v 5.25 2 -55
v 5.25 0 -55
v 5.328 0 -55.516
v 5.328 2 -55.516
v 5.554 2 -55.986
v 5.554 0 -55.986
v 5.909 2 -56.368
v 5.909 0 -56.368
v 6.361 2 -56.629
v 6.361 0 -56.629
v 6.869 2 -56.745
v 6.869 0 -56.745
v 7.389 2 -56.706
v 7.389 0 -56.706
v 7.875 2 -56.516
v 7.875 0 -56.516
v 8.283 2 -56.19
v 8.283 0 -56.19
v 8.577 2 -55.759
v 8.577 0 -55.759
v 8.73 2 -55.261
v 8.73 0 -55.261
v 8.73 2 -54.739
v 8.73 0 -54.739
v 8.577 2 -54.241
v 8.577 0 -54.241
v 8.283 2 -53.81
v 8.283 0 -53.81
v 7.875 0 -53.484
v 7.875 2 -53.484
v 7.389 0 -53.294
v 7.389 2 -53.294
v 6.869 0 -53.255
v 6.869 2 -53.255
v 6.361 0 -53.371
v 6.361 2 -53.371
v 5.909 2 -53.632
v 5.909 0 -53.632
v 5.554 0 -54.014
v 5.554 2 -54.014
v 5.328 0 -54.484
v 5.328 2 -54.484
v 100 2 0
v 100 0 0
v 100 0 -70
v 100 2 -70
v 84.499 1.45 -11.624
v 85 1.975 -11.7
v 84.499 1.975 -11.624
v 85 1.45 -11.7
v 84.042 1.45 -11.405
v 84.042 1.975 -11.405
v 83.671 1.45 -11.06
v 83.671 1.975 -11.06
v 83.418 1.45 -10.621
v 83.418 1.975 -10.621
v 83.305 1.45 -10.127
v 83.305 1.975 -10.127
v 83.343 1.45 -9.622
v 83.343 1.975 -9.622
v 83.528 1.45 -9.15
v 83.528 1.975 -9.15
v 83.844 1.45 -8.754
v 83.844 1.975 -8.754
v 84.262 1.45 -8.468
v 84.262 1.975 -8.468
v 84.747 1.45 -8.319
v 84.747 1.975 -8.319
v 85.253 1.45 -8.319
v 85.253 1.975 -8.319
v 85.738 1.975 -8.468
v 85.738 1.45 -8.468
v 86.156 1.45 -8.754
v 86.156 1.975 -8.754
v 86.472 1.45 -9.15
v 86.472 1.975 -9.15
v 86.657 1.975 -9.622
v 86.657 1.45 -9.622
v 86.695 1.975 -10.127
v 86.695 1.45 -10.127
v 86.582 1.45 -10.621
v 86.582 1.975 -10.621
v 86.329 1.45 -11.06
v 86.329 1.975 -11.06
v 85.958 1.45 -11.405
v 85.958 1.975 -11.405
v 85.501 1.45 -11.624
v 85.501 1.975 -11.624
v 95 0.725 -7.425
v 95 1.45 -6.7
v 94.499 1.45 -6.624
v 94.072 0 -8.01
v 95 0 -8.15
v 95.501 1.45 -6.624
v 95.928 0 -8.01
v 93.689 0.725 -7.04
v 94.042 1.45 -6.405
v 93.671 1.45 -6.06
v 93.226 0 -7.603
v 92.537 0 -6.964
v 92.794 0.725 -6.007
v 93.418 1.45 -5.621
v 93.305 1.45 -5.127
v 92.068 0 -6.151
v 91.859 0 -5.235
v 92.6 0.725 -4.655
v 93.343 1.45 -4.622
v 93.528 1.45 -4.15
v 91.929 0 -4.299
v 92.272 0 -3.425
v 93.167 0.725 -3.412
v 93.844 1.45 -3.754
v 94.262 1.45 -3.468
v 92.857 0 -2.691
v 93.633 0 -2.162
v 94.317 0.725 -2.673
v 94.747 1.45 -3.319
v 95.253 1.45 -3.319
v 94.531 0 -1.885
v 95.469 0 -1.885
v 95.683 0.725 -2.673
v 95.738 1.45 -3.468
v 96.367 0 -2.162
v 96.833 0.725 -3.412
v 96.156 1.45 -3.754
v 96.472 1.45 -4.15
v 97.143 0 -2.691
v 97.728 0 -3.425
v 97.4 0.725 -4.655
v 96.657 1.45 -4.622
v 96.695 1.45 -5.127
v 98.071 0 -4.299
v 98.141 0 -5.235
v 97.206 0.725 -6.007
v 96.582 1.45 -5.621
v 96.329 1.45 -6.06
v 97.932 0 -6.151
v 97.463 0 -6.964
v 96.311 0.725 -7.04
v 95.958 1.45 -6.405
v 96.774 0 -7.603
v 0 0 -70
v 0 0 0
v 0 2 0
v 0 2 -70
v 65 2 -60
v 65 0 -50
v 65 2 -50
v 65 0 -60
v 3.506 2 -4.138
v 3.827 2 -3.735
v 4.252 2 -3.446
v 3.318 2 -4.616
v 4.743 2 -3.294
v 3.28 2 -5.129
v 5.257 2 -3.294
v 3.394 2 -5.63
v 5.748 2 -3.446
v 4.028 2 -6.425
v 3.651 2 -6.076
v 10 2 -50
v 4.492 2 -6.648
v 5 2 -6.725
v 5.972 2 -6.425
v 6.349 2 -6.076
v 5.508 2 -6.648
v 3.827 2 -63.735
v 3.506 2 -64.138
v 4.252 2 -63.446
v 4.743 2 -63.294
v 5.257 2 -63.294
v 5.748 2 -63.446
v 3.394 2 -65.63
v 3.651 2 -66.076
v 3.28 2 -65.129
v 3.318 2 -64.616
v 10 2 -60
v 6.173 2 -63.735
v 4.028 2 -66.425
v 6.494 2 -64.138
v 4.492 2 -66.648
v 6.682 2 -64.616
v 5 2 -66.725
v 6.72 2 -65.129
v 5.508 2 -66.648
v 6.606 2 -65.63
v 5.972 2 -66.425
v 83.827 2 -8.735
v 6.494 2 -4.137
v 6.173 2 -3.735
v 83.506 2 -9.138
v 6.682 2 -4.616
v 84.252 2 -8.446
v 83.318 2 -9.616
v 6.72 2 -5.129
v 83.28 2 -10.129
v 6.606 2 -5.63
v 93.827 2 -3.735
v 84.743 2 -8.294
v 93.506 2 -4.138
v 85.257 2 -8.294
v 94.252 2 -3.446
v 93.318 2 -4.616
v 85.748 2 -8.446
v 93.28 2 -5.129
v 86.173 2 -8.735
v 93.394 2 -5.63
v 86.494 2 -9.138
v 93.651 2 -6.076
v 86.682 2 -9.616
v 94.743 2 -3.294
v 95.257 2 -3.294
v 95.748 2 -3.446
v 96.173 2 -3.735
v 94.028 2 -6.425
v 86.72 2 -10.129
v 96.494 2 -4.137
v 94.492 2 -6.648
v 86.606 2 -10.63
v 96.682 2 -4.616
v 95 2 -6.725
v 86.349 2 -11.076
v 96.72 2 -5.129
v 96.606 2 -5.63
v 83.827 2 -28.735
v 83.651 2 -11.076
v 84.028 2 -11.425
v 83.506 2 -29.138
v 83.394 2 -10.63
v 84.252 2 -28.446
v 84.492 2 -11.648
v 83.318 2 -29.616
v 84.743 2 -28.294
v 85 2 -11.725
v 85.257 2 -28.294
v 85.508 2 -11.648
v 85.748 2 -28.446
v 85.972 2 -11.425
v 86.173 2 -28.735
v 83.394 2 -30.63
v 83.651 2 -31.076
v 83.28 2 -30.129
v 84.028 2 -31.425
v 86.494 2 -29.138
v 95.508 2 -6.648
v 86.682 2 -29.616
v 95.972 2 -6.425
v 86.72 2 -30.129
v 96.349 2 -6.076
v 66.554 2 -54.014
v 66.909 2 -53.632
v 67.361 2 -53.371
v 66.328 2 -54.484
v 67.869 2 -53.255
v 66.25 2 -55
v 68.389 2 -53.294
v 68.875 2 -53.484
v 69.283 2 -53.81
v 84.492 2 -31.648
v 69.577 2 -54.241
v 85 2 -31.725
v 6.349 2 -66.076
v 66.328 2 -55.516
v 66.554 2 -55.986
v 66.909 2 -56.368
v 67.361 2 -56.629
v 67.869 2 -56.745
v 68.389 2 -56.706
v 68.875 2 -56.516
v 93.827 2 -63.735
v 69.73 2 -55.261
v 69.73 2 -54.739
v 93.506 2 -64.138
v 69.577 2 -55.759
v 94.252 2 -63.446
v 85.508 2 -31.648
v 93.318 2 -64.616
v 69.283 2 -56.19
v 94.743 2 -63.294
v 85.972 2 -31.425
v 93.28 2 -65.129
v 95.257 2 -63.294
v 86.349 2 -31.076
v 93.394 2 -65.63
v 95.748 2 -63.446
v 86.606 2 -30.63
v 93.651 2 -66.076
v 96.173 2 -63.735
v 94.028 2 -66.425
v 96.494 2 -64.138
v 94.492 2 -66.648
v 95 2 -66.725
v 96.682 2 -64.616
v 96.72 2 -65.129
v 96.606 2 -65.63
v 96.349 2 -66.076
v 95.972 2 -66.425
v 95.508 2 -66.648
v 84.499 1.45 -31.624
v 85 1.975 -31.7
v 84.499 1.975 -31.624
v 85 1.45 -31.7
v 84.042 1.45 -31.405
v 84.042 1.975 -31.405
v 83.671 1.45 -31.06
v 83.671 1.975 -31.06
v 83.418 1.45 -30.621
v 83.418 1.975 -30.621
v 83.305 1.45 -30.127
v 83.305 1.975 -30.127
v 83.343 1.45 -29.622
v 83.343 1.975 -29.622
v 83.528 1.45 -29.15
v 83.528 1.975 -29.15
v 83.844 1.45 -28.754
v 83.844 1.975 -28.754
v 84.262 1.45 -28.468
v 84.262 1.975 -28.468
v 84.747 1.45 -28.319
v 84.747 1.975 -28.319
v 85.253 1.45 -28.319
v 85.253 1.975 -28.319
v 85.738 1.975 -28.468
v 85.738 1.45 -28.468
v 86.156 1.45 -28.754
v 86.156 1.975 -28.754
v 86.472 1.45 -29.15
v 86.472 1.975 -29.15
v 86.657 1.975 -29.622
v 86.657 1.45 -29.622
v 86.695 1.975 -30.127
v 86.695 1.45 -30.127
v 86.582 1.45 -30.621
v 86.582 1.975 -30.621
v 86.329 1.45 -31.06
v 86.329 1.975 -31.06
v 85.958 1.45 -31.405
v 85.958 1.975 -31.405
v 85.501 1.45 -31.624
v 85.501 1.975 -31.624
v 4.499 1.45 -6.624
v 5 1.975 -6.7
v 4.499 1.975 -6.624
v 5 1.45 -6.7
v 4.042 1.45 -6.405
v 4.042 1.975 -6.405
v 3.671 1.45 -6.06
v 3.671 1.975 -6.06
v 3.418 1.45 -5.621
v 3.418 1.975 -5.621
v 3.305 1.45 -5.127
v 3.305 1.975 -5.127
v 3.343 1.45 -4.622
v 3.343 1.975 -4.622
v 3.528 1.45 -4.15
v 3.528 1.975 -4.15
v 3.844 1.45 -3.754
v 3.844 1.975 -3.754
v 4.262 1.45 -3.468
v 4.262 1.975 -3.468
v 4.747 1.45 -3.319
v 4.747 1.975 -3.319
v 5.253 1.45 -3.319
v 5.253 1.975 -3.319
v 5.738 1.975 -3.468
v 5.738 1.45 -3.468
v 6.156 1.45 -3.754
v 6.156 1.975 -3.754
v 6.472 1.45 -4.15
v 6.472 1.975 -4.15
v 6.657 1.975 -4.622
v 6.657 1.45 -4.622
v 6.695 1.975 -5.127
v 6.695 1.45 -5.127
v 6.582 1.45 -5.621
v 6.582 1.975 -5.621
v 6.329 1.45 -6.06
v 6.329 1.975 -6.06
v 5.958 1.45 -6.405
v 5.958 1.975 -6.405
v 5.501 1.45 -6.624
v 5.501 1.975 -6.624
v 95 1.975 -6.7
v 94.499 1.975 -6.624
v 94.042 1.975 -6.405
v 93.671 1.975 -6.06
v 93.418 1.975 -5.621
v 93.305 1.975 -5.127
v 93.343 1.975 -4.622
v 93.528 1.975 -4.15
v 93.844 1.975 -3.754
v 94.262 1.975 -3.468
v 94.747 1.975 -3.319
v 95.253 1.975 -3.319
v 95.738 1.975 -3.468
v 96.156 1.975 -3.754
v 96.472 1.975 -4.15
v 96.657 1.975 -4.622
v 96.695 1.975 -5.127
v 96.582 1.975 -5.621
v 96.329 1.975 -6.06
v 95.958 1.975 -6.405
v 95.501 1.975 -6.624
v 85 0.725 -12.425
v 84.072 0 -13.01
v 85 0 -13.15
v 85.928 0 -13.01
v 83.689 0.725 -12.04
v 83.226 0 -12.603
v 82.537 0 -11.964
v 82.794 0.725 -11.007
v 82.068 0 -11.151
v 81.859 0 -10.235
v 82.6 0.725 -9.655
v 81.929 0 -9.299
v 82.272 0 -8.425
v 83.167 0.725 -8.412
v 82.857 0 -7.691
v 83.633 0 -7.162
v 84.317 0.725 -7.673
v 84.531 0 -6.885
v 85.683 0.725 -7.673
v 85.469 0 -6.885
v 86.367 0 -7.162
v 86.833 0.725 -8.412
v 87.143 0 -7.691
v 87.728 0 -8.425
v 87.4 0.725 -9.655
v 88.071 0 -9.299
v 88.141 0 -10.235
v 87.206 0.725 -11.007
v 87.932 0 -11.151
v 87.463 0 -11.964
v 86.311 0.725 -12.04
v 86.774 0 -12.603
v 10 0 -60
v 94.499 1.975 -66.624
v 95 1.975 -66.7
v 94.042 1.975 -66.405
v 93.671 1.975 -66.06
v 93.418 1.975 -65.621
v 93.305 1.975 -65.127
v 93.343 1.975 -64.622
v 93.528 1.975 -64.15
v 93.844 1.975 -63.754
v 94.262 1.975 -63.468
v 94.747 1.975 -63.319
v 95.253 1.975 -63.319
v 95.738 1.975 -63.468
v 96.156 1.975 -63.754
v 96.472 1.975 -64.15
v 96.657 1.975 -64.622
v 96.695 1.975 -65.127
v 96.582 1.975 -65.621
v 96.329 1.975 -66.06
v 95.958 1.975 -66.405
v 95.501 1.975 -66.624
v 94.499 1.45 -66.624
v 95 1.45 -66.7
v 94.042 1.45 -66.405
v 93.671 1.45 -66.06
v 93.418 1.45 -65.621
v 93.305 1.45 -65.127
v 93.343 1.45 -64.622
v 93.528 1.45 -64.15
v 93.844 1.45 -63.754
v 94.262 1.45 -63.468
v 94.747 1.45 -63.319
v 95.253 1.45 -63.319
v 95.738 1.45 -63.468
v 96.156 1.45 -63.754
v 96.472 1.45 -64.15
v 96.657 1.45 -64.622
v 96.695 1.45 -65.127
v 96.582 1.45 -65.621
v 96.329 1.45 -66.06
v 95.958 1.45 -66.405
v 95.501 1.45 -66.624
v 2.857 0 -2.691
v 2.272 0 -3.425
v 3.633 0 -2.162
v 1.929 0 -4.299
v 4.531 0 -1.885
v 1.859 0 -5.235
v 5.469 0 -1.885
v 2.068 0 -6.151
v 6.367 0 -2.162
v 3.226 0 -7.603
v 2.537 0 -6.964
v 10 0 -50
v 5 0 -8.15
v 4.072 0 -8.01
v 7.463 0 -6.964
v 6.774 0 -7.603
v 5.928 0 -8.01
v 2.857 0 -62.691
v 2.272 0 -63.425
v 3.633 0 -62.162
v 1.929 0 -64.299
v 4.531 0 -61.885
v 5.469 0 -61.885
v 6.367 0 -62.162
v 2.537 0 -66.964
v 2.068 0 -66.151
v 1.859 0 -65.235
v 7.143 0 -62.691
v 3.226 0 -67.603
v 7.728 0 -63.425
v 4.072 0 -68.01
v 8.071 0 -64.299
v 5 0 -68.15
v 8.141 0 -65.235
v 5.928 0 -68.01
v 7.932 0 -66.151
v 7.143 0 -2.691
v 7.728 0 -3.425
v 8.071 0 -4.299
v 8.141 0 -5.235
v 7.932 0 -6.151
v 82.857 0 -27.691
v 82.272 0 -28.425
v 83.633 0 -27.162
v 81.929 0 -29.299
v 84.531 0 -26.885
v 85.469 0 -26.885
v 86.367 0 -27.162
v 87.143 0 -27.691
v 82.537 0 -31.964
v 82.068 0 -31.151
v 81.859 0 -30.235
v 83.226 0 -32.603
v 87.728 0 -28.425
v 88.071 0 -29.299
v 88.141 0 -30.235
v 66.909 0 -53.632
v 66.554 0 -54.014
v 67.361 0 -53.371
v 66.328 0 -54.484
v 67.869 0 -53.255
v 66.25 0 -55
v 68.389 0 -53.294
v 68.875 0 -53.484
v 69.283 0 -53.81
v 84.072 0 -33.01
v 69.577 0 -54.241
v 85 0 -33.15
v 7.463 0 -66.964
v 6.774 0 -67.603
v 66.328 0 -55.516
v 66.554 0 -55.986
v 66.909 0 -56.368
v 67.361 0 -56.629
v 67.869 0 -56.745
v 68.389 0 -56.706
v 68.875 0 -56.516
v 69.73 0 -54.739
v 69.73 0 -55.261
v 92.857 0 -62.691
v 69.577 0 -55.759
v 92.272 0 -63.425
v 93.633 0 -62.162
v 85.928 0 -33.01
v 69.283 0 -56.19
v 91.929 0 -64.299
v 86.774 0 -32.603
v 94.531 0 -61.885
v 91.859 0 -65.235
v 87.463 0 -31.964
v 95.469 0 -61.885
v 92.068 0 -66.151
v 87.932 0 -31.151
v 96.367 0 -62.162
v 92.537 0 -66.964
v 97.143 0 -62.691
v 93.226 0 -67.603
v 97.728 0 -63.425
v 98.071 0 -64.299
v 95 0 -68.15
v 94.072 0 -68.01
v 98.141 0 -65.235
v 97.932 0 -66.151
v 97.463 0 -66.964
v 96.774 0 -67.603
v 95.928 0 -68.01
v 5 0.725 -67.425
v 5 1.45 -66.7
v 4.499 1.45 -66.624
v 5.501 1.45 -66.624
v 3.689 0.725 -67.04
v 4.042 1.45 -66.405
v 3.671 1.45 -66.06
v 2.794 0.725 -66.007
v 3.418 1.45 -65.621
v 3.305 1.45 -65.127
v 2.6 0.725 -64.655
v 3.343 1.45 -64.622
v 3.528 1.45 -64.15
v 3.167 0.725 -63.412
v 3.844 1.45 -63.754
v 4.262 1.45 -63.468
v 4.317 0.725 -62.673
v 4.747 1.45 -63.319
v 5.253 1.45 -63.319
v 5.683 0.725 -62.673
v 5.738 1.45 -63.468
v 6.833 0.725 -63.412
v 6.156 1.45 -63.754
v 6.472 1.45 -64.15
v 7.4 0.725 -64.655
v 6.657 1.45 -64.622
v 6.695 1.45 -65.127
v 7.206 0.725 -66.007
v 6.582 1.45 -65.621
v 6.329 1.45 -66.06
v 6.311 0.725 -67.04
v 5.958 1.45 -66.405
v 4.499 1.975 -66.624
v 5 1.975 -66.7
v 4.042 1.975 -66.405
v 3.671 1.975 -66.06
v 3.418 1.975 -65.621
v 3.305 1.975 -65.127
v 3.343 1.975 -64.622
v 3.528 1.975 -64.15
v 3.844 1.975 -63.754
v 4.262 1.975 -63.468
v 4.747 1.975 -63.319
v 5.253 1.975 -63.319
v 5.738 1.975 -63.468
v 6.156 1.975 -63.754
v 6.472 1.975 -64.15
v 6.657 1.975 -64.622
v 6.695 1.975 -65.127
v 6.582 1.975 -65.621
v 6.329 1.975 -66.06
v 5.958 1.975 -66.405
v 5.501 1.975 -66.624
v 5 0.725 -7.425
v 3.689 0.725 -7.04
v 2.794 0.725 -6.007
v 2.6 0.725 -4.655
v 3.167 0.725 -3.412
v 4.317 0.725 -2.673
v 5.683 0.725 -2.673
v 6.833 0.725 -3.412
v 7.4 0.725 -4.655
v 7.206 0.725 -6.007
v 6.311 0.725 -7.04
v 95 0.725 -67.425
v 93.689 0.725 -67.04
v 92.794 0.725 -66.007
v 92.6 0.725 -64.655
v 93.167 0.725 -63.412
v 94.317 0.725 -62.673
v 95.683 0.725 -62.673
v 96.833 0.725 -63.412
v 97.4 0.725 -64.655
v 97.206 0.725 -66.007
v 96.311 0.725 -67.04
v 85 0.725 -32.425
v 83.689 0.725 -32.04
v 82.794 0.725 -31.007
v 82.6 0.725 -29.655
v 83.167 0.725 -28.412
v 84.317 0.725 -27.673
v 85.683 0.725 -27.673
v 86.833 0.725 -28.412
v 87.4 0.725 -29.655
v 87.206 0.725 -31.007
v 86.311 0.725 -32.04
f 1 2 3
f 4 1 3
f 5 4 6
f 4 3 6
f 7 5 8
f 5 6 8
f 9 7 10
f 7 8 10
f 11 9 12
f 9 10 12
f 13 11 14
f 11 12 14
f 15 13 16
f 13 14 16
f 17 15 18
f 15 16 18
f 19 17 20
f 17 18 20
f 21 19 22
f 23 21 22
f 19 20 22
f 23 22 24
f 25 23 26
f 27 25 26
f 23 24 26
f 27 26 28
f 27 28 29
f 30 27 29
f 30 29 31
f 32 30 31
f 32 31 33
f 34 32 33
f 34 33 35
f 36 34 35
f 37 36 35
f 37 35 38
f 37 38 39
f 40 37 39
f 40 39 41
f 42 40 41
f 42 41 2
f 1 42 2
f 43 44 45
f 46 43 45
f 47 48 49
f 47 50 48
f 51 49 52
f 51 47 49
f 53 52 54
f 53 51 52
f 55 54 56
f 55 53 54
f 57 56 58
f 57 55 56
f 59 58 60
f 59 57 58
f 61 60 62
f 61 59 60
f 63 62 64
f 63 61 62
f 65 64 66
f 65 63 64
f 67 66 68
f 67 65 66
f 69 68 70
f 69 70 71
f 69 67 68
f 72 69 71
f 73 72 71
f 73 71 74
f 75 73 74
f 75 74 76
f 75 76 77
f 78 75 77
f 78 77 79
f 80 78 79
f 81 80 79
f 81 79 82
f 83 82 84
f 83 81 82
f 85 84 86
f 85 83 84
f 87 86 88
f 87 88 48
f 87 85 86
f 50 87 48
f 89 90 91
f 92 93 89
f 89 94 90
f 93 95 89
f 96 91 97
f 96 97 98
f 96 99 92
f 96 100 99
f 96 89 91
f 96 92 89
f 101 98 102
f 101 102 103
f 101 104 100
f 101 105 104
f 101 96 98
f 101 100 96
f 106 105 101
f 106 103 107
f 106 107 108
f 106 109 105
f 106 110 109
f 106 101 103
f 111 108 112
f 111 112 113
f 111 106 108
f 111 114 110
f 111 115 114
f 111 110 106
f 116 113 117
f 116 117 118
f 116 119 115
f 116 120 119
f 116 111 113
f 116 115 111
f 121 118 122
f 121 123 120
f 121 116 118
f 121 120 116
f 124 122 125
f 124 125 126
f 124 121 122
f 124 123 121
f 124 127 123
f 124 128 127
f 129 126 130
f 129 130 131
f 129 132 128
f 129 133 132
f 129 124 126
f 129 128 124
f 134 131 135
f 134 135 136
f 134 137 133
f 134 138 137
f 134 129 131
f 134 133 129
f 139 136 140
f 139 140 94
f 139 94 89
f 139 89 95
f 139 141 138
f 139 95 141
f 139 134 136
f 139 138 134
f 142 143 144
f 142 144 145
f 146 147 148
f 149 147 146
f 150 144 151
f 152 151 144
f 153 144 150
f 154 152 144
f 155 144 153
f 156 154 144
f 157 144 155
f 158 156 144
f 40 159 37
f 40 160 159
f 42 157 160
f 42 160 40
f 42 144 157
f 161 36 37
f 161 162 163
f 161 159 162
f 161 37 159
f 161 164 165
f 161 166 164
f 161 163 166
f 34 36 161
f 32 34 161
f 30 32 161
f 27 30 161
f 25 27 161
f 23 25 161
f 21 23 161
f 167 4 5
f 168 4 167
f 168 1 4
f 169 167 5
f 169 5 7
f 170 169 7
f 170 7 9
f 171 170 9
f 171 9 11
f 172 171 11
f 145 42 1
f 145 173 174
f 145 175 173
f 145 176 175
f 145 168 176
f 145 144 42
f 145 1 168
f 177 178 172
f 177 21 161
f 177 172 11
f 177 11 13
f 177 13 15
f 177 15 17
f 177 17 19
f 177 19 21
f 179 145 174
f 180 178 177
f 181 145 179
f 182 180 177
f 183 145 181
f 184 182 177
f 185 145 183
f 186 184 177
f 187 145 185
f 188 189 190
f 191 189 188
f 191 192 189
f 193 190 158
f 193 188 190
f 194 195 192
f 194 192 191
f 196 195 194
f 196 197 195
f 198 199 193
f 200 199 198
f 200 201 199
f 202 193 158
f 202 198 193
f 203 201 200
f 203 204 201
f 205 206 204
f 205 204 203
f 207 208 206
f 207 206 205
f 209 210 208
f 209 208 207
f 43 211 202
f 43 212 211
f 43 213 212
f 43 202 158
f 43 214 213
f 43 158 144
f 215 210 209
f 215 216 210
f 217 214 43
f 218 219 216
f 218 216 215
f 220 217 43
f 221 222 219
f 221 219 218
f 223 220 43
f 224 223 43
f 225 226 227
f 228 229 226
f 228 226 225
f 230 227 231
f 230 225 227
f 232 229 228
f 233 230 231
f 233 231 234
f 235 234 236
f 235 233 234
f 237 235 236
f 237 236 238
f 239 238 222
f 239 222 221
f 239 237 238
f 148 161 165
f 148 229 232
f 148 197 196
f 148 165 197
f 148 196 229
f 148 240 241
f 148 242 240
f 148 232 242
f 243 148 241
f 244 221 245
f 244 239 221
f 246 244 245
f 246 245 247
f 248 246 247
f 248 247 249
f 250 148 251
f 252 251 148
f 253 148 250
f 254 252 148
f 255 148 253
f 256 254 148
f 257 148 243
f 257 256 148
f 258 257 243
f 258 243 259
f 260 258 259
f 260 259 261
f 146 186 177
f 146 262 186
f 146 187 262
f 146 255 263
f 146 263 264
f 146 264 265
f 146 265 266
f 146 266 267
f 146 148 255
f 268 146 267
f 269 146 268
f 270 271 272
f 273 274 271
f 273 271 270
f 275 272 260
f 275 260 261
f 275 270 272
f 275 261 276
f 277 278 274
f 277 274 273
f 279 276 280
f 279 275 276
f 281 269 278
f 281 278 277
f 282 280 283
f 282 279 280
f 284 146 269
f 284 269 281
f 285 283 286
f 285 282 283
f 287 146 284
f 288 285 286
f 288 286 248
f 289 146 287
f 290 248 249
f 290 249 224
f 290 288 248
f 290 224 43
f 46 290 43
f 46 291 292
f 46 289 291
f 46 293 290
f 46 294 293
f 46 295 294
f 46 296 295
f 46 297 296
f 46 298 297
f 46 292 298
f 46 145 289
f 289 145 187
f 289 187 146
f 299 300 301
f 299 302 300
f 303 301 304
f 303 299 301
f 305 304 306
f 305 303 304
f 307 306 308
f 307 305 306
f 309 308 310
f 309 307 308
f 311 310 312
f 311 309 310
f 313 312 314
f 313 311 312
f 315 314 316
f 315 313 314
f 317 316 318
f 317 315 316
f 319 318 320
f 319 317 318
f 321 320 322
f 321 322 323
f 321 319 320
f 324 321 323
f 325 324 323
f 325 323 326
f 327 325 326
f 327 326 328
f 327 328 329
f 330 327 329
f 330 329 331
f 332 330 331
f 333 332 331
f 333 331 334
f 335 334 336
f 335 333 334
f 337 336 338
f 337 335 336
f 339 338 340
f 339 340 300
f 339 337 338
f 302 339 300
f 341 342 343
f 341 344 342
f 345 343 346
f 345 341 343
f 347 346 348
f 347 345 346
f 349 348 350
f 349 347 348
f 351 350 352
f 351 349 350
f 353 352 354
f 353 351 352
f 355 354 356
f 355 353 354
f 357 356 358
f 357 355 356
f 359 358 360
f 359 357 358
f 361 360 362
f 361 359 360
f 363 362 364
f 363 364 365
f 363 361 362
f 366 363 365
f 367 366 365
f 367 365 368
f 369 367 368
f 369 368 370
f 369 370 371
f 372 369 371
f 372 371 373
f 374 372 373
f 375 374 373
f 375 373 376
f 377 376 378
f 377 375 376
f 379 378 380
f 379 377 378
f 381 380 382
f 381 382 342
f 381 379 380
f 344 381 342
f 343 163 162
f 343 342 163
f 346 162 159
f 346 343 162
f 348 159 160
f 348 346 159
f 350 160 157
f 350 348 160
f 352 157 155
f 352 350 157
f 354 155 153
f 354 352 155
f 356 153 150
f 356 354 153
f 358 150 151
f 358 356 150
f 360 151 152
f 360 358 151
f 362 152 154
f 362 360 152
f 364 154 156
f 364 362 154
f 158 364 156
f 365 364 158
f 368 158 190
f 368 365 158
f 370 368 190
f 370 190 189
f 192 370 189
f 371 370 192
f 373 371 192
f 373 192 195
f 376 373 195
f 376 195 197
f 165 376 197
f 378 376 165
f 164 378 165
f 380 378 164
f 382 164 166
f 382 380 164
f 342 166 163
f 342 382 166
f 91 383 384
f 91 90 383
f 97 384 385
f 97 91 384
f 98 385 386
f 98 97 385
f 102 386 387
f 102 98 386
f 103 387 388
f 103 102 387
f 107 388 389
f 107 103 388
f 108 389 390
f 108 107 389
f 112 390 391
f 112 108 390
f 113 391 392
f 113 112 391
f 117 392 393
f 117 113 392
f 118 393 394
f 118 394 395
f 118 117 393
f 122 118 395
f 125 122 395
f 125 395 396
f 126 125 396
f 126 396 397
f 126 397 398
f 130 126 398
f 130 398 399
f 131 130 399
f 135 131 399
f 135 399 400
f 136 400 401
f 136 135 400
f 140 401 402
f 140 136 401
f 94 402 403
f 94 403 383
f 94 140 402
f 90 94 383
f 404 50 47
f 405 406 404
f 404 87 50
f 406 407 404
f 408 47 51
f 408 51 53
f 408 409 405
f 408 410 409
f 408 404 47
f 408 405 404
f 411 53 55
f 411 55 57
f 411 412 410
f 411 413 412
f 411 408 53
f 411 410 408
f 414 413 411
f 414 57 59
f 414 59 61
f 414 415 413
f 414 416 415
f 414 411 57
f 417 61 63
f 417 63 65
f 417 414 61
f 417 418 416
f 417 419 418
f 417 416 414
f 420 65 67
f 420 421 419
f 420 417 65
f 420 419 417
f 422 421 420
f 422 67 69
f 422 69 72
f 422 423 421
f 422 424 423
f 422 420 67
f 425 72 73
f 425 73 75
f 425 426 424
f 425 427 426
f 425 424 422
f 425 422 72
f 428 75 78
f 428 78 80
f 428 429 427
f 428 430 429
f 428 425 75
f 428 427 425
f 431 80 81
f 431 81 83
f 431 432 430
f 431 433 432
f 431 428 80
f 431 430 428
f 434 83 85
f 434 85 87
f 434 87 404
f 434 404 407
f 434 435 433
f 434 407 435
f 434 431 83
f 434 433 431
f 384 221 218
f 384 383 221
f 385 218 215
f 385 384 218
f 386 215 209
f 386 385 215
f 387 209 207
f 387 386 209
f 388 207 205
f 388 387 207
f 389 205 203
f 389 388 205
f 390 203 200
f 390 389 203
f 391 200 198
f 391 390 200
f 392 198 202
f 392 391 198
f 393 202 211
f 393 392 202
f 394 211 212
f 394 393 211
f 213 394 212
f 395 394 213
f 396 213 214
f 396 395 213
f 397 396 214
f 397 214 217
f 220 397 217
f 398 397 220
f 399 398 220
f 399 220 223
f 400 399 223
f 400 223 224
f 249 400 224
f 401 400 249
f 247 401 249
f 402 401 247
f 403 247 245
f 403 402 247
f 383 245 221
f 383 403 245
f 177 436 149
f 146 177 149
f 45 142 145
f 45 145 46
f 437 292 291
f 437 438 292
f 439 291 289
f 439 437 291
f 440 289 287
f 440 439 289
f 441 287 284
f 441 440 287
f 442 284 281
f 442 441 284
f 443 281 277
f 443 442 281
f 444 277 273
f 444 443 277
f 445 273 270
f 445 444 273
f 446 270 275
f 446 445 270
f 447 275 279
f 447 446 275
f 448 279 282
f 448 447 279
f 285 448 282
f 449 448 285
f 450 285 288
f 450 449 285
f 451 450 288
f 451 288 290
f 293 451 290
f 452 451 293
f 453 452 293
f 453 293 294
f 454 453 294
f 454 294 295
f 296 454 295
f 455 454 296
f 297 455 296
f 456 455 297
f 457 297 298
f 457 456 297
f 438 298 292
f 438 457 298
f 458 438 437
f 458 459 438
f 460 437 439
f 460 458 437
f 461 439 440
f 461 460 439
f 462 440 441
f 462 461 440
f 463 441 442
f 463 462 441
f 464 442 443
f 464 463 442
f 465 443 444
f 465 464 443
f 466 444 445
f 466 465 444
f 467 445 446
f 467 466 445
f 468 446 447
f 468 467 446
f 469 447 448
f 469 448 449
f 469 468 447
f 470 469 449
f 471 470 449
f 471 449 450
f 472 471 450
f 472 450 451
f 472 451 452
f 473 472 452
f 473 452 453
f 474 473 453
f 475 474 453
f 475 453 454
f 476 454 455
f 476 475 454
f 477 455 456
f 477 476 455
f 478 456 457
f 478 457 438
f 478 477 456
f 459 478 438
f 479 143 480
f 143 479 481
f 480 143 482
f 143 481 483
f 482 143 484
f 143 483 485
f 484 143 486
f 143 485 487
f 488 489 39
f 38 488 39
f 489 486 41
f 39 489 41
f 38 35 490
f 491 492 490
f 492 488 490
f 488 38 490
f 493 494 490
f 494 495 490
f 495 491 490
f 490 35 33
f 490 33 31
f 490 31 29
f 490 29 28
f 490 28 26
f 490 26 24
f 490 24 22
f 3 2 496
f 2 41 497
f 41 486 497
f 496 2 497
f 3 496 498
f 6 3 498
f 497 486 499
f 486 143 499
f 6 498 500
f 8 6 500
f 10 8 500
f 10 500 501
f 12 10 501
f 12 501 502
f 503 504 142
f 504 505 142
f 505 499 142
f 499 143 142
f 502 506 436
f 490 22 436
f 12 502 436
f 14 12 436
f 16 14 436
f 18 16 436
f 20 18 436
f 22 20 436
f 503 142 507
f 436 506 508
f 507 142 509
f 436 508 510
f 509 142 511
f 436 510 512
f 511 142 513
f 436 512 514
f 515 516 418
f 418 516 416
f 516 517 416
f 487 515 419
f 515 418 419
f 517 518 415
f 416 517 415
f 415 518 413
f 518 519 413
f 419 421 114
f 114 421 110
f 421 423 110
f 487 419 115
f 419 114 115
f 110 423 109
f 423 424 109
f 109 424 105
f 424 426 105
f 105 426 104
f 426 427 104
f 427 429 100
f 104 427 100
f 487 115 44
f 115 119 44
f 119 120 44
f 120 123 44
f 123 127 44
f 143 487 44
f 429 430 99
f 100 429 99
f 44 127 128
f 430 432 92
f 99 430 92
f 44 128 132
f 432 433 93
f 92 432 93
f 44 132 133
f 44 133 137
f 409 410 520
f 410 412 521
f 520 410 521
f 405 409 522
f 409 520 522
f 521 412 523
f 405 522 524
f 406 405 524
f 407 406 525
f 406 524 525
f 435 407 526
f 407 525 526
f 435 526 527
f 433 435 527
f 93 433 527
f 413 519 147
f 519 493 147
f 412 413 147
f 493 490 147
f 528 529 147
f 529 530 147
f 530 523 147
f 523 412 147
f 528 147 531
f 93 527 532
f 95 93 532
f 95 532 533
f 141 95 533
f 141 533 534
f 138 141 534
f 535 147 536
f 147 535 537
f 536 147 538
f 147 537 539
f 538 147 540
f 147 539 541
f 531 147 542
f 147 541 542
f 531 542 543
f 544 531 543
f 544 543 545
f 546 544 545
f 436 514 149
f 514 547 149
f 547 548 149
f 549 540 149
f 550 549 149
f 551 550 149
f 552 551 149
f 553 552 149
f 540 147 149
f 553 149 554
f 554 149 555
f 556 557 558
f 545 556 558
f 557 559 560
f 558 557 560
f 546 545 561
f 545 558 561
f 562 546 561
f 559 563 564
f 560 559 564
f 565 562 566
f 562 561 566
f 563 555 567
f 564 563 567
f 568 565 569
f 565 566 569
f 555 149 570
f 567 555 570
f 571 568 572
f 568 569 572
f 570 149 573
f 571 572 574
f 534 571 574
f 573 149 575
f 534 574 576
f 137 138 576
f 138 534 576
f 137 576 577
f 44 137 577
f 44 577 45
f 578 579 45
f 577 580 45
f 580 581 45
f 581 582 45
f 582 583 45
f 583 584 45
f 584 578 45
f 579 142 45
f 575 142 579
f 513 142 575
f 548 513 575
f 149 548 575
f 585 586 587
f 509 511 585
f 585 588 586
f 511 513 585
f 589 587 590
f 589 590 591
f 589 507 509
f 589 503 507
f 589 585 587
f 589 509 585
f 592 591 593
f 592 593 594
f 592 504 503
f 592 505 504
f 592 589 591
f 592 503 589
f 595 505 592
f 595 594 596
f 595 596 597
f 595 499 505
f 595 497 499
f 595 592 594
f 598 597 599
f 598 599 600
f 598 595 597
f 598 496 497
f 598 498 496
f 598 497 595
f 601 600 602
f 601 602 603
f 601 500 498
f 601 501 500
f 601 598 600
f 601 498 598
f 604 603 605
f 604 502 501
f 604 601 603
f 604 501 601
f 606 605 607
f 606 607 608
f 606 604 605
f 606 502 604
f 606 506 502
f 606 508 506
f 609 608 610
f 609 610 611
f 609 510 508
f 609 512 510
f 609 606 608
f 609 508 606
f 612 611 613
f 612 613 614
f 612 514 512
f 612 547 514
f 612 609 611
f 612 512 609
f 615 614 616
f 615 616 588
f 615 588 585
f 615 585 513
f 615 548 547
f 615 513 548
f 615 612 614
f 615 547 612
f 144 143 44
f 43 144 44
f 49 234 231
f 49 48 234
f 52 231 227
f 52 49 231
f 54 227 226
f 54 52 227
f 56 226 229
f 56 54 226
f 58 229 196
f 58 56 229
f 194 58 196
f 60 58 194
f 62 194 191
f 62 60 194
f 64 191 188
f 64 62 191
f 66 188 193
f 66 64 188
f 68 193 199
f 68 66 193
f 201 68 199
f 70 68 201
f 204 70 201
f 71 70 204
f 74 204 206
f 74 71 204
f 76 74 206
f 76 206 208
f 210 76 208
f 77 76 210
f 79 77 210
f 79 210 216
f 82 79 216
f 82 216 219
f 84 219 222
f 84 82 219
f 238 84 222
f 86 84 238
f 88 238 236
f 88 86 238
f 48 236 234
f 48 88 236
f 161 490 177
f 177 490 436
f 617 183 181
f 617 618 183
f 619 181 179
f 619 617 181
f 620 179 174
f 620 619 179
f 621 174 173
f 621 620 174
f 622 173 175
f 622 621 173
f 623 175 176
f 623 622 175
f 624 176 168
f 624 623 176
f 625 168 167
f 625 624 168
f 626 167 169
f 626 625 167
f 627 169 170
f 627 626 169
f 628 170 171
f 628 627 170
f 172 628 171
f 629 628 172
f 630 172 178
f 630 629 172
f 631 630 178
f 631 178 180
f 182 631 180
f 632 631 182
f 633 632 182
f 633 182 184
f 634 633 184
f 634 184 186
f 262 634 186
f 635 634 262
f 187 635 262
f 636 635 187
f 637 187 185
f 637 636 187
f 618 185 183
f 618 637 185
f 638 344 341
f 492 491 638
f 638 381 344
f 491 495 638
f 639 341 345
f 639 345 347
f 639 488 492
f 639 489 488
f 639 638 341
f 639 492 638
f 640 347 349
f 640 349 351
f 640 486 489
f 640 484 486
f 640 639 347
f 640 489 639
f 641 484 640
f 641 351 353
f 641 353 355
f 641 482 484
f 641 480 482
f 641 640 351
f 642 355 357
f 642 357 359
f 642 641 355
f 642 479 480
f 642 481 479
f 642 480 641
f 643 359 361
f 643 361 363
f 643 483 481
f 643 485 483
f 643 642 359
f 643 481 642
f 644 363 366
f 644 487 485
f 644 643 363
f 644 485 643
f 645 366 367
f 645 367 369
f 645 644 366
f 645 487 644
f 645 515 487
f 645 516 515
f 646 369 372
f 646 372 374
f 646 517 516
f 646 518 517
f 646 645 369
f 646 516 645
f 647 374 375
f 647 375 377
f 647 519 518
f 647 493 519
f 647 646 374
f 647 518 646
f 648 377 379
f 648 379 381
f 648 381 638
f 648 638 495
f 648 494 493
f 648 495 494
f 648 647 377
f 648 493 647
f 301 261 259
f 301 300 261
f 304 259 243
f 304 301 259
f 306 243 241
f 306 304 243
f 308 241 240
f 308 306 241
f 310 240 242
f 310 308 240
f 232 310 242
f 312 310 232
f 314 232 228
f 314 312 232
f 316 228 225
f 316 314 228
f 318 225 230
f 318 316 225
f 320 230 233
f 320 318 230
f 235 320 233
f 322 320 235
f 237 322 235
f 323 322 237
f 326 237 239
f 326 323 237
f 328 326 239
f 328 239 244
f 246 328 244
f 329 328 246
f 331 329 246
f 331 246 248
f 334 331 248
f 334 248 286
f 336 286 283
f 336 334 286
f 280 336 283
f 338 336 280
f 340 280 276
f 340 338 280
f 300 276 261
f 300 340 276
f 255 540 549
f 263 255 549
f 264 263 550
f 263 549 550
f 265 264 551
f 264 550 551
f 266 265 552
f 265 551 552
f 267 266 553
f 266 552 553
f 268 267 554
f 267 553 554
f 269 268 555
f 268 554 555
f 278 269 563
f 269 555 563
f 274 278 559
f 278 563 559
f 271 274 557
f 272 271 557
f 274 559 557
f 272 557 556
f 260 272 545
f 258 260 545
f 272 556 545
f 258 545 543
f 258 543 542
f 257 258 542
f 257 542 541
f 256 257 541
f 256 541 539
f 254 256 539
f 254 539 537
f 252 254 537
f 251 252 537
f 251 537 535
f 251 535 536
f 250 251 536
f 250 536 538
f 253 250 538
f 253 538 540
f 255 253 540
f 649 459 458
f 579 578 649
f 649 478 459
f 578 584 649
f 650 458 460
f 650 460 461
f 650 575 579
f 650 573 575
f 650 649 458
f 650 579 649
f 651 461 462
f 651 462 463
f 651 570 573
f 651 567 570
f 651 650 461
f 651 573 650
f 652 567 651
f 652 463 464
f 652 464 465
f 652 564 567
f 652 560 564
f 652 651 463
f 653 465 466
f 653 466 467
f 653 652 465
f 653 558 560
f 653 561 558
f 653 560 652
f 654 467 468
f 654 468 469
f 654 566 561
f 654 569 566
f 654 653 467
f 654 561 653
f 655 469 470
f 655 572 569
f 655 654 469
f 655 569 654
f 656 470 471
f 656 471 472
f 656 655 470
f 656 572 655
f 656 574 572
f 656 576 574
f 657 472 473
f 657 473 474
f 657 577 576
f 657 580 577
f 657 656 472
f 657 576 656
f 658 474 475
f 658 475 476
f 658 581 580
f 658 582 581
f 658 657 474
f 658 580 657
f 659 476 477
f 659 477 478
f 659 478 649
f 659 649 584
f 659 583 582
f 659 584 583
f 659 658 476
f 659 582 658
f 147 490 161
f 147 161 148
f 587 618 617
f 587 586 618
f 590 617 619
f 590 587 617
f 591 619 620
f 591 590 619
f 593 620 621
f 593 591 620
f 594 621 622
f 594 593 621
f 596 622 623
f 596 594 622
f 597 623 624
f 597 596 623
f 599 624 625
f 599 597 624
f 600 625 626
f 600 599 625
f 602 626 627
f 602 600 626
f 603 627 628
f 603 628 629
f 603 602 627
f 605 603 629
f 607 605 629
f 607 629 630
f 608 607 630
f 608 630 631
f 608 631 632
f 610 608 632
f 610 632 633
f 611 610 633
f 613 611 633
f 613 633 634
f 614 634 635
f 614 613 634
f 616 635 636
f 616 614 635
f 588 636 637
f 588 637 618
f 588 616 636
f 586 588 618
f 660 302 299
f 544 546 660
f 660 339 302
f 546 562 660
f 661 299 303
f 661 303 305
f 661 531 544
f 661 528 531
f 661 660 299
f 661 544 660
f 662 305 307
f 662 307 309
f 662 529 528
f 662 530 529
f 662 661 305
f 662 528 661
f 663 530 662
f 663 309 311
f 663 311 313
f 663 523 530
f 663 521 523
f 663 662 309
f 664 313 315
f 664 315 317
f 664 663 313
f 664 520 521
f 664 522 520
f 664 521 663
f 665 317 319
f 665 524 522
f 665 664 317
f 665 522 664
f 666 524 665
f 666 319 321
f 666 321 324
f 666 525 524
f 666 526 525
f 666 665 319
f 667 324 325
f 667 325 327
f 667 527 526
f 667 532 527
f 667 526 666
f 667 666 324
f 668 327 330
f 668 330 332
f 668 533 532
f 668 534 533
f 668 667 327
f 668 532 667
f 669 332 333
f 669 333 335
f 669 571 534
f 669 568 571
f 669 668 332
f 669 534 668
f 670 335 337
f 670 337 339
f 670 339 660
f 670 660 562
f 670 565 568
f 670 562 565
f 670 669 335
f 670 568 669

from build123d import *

# Parameters (mm, degrees)
SKIZZE1_W                                      = 100
SKIZZE1_H                                      = 70
SKIZZE1_W_2                                    = 55
SKIZZE1_H_2                                    = 10
AUFSATZ_LINEAR_AUSTRAGEN1_DEPTH                = 2
F_3_5_3_5_DURCHMESSER_BOHRUNG1_D               = 3.5
FORMSENKUNG_F_R_M3_LINSENSENKSCHRAUB_2_COUNT   = 2
FORMSENKUNG_F_R_M3_LINSENSENKSCHRAUB_2_PITCH   = 90
FORMSENKUNG_F_R_M3_LINSENSENKSCHRAUB_3_COUNT   = 2
FORMSENKUNG_F_R_M3_LINSENSENKSCHRAUB_3_PITCH   = 108.166538264
FORMSENKUNG_F_R_M3_LINSENSENKSCHRAUB_4_COUNT   = 2
FORMSENKUNG_F_R_M3_LINSENSENKSCHRAUB_4_PITCH   = 60
FORMSENKUNG_F_R_M3_LINSENSENKSCHRAUB_5_A_COUNT = 2
FORMSENKUNG_F_R_M3_LINSENSENKSCHRAUB_5_A_PITCH = 20


with BuildPart() as part:
    # Skizze1 → Aufsatz-Linear austragen1 (new body)
    with BuildSketch(Plane(origin=(0, 0, 0), x_dir=(1, 0, 0), z_dir=(0, 1, 0))):
        with Locations((50, 35)):
            Rectangle(SKIZZE1_W, SKIZZE1_H)
        with Locations((37.5, 55)):
            Rectangle(SKIZZE1_W_2, SKIZZE1_H_2, mode=Mode.SUBTRACT)
    extrude(amount=AUFSATZ_LINEAR_AUSTRAGEN1_DEPTH)

    # Ø3.5 (3.5) Durchmesser Bohrung1 (through all)
    with Locations(Plane(origin=(0, 2, 0), x_dir=(1, 0, 0), z_dir=(0, 1, 0))):
        with Locations((7, 55), (68, 55)):
            Hole(F_3_5_3_5_DURCHMESSER_BOHRUNG1_D / 2)

    # Skizze7 → Formsenkung f_r M3 Linsensenkschraube mi (revolve, cut)
    with BuildSketch(Plane(origin=(5, 0, -5), x_dir=(0, 0, -1), z_dir=(1, 0, 0))):
        Polygon((0, 0), (0, 2), (1.725, 2), (1.7, 1.975), (1.7, 1.45), (3.15, 0), align=None)
    formsenkung_f_r_m3_linsensenkschraube_mi = revolve(axis=Axis((5, -6.35, -5), (0, 1, 0)), mode=Mode.SUBTRACT)

    # Formsenkung f_r M3 Linsensenkschraub 2: Formsenkung f_r M3 Linsensenkschraube mi ×2
    with Locations(*[(i * FORMSENKUNG_F_R_M3_LINSENSENKSCHRAUB_2_PITCH, 0, 0) for i in range(1, FORMSENKUNG_F_R_M3_LINSENSENKSCHRAUB_2_COUNT)]):
        add(formsenkung_f_r_m3_linsensenkschraube_mi, mode=Mode.SUBTRACT)

    # Formsenkung f_r M3 Linsensenkschraub 3: Formsenkung f_r M3 Linsensenkschraube mi ×2
    with Locations(*[Vector(0.8320502943378437, 0, -0.5547001962252291) * (i * FORMSENKUNG_F_R_M3_LINSENSENKSCHRAUB_3_PITCH) for i in range(1, FORMSENKUNG_F_R_M3_LINSENSENKSCHRAUB_3_COUNT)]):
        add(formsenkung_f_r_m3_linsensenkschraube_mi, mode=Mode.SUBTRACT)

    # Formsenkung f_r M3 Linsensenkschraub 4: Formsenkung f_r M3 Linsensenkschraube mi ×2
    with Locations(*[(0, 0, -i * FORMSENKUNG_F_R_M3_LINSENSENKSCHRAUB_4_PITCH) for i in range(1, FORMSENKUNG_F_R_M3_LINSENSENKSCHRAUB_4_COUNT)]):
        add(formsenkung_f_r_m3_linsensenkschraube_mi, mode=Mode.SUBTRACT)

    # Skizze9 → Formsenkung f_r M3 Linsensenkschraub 5 (revolve, cut)
    with BuildSketch(Plane(origin=(85, 0, -10), x_dir=(0, 0, -1), z_dir=(1, 0, 0))):
        Polygon((0, 0), (0, 2), (1.725, 2), (1.7, 1.975), (1.7, 1.45), (3.15, 0), align=None)
    formsenkung_f_r_m3_linsensenkschraub_5 = revolve(axis=Axis((85, -6.35, -10), (0, 1, 0)), mode=Mode.SUBTRACT)

    # Formsenkung f_r M3 Linsensenkschraub 5 a: Formsenkung f_r M3 Linsensenkschraub 5 ×2
    with Locations(*[(0, 0, -i * FORMSENKUNG_F_R_M3_LINSENSENKSCHRAUB_5_A_PITCH) for i in range(1, FORMSENKUNG_F_R_M3_LINSENSENKSCHRAUB_5_A_COUNT)]):
        add(formsenkung_f_r_m3_linsensenkschraub_5, mode=Mode.SUBTRACT)


solid = part.part
